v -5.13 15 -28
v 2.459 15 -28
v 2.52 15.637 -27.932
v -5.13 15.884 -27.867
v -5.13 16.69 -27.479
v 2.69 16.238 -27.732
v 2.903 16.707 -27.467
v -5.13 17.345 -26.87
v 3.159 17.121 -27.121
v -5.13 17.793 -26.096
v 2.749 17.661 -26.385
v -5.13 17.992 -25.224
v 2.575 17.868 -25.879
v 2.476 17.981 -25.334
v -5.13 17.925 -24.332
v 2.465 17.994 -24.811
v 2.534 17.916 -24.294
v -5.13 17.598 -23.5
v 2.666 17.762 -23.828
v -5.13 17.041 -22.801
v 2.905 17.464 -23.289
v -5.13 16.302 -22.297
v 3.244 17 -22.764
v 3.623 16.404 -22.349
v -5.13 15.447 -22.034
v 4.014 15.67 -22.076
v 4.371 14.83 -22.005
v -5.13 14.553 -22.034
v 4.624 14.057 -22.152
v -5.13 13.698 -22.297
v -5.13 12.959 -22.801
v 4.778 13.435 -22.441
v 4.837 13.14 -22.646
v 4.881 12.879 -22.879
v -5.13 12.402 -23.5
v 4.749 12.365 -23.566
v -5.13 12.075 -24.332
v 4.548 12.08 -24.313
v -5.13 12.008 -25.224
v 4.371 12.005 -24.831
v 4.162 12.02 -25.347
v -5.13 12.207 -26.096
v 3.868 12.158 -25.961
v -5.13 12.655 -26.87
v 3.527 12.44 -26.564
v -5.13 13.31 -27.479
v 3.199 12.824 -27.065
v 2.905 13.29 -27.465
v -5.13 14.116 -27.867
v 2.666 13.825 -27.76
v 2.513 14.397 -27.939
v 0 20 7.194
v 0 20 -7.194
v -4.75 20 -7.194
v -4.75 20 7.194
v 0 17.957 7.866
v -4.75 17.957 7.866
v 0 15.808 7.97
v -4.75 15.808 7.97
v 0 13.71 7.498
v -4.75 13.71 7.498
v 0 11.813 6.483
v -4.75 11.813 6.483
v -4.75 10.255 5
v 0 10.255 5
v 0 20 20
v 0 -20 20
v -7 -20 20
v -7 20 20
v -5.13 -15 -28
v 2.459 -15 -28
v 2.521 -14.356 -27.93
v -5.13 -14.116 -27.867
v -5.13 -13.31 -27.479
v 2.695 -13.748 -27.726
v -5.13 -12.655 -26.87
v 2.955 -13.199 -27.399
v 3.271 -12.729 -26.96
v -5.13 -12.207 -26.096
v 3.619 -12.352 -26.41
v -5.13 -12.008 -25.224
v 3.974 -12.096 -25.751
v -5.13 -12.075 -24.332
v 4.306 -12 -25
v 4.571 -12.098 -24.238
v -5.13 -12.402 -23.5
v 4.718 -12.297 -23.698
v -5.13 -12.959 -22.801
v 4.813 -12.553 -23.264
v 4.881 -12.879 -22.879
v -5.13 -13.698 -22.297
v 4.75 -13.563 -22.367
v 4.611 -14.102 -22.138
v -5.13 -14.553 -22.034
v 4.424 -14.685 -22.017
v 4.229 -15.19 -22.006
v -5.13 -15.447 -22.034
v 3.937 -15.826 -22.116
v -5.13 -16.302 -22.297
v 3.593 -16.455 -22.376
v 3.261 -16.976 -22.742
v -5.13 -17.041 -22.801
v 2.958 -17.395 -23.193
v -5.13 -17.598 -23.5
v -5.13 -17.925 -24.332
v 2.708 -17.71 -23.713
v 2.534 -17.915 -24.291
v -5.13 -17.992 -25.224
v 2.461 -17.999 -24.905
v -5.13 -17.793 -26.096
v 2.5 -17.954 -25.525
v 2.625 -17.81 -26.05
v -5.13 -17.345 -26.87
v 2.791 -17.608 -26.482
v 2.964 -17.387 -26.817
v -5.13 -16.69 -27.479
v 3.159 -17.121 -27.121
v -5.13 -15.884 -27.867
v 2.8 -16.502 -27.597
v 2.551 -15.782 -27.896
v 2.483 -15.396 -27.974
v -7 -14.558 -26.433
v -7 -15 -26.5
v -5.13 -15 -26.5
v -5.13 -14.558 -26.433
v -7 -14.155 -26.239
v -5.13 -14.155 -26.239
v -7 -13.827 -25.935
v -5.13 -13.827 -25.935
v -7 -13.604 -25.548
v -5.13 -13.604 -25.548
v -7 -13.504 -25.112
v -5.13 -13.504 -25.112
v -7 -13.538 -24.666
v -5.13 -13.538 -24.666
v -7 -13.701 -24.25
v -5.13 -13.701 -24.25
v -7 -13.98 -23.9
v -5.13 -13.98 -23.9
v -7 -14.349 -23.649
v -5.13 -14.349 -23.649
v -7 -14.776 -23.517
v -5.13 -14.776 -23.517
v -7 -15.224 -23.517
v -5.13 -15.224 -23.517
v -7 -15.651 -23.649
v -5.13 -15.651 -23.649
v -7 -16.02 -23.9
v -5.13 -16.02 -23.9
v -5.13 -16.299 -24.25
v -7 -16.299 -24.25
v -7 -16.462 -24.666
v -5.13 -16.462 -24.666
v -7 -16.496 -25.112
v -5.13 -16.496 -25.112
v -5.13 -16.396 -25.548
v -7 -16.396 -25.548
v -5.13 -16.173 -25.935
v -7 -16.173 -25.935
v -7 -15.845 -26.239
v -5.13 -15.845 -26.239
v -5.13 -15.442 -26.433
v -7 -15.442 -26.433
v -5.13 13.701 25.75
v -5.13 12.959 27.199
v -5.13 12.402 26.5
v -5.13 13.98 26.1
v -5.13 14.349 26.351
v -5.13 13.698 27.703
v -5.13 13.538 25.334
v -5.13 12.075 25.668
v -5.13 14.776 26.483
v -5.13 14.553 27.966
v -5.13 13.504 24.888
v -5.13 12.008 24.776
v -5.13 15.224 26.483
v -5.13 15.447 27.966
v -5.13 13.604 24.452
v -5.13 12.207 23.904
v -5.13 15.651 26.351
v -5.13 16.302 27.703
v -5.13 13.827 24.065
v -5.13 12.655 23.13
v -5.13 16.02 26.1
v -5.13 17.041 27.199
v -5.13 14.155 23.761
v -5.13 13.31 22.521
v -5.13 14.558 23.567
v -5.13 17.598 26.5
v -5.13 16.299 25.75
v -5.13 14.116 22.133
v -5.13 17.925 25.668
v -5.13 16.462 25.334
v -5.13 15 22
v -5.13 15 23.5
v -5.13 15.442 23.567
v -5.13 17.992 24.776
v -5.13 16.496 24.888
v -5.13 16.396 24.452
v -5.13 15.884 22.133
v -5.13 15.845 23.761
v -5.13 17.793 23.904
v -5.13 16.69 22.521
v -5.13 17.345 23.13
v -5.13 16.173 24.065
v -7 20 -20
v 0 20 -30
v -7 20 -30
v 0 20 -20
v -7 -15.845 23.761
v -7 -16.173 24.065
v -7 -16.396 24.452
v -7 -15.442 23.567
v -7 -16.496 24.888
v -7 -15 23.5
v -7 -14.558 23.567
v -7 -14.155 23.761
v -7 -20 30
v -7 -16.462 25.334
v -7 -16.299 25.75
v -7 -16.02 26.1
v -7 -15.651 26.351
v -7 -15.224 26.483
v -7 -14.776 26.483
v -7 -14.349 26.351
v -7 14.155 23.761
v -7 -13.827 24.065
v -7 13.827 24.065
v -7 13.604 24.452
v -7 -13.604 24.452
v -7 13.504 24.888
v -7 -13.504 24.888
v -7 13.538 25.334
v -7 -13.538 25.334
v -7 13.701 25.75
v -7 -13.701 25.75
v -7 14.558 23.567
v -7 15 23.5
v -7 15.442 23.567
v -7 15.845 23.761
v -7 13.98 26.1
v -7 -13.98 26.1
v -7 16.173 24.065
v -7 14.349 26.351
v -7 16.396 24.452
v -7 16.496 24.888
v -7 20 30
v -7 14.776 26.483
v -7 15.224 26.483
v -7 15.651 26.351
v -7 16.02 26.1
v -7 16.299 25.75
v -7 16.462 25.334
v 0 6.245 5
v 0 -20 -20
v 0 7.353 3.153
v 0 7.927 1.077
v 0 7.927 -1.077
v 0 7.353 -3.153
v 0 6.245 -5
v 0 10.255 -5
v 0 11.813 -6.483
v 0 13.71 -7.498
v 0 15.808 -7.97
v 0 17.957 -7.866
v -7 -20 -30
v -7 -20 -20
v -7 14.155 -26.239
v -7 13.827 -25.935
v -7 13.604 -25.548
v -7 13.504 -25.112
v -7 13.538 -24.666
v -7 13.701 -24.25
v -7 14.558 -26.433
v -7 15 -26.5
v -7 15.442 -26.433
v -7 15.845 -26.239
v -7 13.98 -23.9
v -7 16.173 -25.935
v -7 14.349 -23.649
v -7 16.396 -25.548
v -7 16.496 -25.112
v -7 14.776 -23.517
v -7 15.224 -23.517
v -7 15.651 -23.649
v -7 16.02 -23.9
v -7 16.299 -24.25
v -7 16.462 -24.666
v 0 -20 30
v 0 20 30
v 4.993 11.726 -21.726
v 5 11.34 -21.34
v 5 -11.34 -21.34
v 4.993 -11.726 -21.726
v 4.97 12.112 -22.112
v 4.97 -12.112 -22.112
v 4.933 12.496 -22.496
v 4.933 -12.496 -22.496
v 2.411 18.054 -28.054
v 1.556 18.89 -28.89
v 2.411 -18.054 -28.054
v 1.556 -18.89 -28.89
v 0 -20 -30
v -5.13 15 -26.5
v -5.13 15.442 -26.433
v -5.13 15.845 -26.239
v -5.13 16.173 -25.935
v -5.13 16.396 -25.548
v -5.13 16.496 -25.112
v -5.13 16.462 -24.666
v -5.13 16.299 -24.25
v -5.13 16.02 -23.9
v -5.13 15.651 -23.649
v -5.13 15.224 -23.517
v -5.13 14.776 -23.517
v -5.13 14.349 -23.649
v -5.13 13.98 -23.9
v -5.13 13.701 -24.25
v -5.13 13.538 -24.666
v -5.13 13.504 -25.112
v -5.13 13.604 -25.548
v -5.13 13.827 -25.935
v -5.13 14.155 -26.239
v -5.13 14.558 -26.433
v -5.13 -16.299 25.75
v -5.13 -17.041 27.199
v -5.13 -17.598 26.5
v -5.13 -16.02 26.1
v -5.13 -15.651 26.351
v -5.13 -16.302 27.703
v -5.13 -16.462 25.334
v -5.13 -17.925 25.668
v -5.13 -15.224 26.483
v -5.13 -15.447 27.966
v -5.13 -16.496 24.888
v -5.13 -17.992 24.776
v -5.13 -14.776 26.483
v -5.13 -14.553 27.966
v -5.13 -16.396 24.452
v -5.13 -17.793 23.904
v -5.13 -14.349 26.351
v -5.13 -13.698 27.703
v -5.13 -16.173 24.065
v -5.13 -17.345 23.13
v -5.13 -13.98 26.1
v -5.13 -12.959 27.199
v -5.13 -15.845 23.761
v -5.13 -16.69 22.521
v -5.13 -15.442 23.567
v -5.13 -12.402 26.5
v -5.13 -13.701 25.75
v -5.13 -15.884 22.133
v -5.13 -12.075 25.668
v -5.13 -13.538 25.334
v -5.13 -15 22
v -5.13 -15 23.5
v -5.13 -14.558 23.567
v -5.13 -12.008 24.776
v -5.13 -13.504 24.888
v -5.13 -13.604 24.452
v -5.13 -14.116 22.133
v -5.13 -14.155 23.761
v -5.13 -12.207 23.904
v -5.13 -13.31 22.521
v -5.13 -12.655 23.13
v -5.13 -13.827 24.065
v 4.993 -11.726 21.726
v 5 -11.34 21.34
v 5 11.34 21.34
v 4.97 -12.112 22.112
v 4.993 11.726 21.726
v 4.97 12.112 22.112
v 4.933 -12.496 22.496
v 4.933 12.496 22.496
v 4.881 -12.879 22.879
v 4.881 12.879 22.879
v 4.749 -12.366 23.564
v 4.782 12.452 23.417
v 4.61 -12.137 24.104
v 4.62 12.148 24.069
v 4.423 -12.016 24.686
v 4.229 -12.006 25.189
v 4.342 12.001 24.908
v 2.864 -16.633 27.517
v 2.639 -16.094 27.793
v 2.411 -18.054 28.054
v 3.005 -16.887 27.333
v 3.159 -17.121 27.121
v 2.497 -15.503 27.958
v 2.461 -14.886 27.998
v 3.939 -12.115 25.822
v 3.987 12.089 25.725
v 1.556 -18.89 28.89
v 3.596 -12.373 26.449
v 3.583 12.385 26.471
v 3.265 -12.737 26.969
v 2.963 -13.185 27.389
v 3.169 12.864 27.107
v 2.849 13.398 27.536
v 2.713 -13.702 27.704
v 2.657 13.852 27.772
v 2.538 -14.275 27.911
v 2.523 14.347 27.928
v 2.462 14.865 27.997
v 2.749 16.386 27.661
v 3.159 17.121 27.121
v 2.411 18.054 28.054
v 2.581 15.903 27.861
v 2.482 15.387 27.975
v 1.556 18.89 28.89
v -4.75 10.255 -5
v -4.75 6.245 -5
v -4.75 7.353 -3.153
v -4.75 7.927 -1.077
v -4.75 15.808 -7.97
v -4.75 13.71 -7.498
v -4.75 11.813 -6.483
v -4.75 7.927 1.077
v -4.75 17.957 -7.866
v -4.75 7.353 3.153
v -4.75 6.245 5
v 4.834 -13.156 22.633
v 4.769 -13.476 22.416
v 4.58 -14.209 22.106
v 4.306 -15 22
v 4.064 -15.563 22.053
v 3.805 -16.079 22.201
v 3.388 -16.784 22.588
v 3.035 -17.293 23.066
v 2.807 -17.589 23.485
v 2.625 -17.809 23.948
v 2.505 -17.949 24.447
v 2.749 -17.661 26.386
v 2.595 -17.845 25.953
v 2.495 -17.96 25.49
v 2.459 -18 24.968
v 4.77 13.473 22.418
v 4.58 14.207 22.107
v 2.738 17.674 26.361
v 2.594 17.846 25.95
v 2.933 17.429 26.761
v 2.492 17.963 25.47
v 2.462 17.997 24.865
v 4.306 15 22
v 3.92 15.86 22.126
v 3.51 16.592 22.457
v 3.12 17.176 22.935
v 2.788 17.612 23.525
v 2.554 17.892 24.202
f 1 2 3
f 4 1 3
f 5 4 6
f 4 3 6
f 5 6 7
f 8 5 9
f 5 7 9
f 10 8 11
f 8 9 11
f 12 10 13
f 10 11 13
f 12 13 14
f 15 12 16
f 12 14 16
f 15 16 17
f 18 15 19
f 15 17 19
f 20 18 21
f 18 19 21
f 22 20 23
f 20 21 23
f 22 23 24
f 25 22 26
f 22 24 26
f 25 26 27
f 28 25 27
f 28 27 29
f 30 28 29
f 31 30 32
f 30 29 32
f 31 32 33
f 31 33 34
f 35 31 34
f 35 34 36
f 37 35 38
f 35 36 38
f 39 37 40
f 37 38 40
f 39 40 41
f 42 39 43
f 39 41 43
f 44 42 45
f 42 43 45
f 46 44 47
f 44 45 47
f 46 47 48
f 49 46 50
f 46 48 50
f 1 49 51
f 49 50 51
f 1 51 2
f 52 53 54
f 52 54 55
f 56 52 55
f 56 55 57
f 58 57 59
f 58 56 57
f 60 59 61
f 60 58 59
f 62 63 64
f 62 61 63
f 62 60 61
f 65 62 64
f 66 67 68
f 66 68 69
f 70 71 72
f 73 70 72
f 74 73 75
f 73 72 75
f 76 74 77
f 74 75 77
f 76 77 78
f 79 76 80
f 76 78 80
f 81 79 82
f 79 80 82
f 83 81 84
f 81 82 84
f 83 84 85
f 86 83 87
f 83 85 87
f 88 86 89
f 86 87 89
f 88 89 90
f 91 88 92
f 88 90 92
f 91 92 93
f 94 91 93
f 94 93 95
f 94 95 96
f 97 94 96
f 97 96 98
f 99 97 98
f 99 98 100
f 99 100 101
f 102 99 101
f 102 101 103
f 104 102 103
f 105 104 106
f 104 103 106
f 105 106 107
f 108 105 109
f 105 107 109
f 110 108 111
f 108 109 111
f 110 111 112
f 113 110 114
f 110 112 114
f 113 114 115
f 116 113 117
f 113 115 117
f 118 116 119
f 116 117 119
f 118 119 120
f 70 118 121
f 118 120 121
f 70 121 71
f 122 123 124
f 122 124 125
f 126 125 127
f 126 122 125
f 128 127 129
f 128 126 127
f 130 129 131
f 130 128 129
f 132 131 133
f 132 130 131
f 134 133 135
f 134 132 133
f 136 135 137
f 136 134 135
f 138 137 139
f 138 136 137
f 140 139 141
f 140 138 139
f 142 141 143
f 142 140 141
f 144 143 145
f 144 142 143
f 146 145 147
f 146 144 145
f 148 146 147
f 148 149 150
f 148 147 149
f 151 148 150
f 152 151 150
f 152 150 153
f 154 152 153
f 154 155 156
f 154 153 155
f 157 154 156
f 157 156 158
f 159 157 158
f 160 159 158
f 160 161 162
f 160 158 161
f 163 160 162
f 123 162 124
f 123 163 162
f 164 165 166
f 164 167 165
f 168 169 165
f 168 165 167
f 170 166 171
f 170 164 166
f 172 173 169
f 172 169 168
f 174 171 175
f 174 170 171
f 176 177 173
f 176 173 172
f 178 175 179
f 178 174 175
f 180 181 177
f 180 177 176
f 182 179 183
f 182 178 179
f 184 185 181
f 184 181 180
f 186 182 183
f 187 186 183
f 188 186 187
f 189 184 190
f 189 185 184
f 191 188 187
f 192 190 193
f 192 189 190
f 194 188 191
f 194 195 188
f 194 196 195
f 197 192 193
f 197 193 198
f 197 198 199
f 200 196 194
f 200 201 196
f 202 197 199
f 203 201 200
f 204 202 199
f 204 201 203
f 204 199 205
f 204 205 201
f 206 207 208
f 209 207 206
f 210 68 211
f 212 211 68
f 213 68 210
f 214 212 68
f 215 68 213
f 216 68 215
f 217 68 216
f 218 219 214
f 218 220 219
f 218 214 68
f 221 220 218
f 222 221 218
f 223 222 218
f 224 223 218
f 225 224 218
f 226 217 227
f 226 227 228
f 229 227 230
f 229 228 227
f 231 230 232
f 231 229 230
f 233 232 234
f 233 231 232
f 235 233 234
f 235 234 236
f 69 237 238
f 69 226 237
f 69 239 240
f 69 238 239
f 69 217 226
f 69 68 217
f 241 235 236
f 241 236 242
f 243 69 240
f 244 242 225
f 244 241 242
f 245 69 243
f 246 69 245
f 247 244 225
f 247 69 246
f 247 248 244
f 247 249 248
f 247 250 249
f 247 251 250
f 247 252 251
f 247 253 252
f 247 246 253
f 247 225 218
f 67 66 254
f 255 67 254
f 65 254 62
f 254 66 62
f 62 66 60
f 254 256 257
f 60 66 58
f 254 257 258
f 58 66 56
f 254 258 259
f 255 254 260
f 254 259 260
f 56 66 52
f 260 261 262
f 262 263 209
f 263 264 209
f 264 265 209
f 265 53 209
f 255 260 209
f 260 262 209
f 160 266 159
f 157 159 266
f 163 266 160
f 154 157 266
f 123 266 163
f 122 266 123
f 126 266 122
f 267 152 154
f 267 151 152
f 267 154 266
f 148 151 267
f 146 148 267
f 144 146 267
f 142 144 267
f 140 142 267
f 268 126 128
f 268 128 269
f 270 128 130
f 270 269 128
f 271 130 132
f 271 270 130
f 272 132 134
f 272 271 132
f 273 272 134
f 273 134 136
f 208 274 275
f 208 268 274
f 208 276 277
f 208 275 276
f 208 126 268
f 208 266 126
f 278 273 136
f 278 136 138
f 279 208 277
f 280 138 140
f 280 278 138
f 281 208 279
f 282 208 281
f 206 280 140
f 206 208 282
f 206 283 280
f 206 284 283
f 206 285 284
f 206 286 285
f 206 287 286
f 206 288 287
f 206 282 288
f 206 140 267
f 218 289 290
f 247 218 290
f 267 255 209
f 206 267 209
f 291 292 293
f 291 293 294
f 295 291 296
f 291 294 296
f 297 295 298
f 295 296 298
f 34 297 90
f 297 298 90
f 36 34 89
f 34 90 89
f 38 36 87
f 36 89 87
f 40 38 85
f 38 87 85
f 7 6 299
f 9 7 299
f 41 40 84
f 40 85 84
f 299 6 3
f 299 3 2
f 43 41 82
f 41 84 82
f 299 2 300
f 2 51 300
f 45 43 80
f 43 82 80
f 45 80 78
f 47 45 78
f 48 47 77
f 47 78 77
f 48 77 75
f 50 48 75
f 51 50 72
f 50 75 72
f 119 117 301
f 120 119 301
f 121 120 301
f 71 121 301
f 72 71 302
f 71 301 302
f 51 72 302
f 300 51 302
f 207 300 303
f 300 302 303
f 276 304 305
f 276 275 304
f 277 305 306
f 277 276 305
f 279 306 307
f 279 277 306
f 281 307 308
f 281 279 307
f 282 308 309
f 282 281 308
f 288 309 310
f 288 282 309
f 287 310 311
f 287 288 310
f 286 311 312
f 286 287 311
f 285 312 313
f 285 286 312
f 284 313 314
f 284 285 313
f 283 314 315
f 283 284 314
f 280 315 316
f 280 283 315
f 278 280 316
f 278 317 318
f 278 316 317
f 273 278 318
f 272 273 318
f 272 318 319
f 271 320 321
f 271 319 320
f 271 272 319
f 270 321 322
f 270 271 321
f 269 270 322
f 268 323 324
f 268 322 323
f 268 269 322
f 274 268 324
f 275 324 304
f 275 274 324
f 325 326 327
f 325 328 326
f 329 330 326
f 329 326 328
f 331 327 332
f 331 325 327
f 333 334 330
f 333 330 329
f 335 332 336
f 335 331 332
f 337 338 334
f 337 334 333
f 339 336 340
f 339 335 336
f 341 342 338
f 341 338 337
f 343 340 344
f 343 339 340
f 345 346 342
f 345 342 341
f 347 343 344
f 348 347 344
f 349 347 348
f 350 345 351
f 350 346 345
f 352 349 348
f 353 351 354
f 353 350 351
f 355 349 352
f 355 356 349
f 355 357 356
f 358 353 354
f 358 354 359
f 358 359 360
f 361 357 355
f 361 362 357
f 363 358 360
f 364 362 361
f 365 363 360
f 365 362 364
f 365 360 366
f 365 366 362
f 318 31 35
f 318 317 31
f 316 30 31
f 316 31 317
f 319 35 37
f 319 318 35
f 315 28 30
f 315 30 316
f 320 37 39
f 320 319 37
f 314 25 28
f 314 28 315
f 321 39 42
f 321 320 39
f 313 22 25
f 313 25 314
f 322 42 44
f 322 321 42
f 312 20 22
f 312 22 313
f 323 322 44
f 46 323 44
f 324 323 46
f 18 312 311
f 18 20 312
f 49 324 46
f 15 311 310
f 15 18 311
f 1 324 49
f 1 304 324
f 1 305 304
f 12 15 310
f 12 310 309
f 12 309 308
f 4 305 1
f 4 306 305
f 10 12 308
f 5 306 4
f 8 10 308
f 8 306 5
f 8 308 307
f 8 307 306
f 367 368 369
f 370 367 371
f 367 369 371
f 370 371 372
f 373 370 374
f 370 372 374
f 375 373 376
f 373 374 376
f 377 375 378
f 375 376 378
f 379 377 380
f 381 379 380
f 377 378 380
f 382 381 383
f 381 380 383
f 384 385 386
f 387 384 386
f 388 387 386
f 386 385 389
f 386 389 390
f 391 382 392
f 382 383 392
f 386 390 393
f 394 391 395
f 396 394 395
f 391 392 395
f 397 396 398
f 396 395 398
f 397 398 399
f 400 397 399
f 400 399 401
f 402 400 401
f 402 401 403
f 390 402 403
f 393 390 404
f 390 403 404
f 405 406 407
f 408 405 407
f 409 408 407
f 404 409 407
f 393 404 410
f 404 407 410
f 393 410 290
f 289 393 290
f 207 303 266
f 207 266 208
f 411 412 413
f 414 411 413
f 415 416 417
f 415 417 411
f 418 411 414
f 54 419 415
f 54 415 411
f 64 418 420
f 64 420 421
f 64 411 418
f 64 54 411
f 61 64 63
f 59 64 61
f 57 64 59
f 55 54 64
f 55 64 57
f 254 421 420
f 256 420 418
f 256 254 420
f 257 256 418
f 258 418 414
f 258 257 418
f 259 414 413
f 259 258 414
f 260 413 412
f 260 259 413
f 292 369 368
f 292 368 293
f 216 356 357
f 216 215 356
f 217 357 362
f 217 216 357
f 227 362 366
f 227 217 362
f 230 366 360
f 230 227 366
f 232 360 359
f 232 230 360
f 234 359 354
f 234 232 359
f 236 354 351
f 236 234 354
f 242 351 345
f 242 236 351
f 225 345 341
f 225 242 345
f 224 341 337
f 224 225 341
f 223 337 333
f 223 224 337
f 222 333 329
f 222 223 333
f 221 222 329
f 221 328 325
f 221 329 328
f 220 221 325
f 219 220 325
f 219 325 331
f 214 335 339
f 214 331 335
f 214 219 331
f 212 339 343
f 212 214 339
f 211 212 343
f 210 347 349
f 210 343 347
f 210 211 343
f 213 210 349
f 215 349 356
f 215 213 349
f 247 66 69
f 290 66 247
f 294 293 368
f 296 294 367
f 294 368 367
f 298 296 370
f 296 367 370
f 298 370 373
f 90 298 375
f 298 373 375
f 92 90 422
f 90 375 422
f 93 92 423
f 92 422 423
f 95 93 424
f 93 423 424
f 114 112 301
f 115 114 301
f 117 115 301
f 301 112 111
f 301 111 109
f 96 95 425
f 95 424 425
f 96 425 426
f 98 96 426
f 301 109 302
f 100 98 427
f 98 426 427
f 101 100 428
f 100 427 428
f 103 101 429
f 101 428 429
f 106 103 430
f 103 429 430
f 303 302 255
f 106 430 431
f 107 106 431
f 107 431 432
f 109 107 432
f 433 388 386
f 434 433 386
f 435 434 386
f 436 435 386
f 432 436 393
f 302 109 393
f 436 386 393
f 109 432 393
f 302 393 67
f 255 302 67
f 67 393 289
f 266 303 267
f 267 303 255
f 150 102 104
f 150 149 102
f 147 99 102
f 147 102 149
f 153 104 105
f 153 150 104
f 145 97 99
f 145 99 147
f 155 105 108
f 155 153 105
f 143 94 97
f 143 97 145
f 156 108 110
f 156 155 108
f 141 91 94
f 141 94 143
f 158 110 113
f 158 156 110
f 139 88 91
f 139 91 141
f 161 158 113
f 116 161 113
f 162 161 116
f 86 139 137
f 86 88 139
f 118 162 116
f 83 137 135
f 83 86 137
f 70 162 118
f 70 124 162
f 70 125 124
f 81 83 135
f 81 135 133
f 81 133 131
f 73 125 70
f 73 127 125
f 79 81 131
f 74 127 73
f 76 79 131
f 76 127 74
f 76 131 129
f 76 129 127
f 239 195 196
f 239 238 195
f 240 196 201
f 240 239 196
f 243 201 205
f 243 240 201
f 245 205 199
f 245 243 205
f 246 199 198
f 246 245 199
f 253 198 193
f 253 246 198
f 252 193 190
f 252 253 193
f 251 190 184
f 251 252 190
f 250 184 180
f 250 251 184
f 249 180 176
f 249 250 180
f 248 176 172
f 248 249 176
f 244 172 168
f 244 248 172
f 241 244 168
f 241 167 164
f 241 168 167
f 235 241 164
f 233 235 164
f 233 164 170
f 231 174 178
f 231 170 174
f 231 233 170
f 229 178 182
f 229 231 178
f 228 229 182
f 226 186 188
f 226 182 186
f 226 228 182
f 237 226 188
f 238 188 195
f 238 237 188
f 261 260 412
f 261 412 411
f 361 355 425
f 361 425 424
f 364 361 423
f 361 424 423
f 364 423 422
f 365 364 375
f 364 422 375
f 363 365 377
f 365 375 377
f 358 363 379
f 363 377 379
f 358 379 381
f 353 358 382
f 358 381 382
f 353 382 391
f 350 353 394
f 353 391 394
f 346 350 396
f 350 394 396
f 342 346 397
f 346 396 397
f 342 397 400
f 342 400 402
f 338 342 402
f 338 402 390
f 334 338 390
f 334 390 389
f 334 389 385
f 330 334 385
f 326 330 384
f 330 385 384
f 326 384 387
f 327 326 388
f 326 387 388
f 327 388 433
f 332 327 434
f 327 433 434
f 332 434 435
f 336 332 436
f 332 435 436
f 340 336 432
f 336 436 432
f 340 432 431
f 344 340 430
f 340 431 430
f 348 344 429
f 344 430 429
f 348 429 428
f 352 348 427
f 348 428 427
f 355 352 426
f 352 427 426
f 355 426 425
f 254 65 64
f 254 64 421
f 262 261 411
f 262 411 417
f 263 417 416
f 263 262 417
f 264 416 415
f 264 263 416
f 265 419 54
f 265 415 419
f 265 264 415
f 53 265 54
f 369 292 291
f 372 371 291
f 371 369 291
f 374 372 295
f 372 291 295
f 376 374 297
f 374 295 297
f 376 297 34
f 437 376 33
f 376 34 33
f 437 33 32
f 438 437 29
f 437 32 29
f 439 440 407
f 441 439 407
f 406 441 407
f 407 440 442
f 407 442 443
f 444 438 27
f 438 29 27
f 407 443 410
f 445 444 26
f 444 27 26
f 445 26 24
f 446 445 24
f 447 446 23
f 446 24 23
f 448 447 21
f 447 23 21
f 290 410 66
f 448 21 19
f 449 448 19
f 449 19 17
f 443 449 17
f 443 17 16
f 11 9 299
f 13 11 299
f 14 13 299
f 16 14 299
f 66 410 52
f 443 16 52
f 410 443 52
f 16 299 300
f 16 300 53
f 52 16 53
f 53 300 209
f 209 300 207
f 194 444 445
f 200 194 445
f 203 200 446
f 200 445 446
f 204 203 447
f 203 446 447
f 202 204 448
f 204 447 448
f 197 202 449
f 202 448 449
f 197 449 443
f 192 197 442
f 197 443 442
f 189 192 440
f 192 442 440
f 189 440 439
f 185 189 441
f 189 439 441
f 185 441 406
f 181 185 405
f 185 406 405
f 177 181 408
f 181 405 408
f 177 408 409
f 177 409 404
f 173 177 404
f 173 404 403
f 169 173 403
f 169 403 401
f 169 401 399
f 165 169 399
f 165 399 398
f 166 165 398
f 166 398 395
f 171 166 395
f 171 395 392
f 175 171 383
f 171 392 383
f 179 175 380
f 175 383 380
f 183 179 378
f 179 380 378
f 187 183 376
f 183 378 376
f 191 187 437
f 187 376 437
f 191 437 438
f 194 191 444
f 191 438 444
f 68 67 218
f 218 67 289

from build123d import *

# Parameters (mm, degrees)
CROQUIS1_W                 = 60
CROQUIS1_H                 = 40
SALIENTE_EXTRUIR1_DEPTH    = 5
CROQUIS3_R                 = 1.5
CORTAR_EXTRUIR1_DEPTH      = 37.400549446
REDONDEO1_R                = 10
CROQUIS5_R                 = 3
CORTAR_EXTRUIR2_DEPTH      = 3.5
CROQUIS9_W                 = 10
CROQUIS9_H                 = 40
SALIENTE_EXTRUIR3_DEPTH    = 7
CORTAR_EXTRUIR5_DEPTH      = 37.728735481
CORTAR_EXTRUIR5_DEPTH_BACK = 37.728735481
CROQUIS10_R                = 1.5
CROQUIS11_R                = 3
CORTAR_EXTRUIR6_DEPTH      = 6.63
SALIENTE_EXTRUIR4_DEPTH    = 7
CORTAR_EXTRUIR7_START      = -7
CROQUIS13_R                = 8
CORTAR_EXTRUIR7_DEPTH      = 7
CORTAR_EXTRUIR8_START      = -2.25
CORTAR_EXTRUIR8_DEPTH      = 2.25


with BuildPart() as part:
    # Croquis1 → Saliente-Extruir1 (new body)
    with BuildSketch(Plane(origin=(0, 0, 0), x_dir=(0, 0, -1), z_dir=(1, 0, 0))):
        Rectangle(CROQUIS1_W, CROQUIS1_H)
    extrude(amount=SALIENTE_EXTRUIR1_DEPTH)

    # Croquis3 → Cortar-Extruir1 (cut, through all)
    with BuildSketch(Plane(origin=(5, 0, 0), x_dir=(0, 0, -1), z_dir=(1, 0, 0))):
        with Locations((-25, 15)):
            Circle(CROQUIS3_R)
        with Locations(Location((25, 15, 0), (0, 0, 180))):
            Circle(CROQUIS3_R)
        with Locations((25, -15)):
            Circle(CROQUIS3_R)
        with Locations(Location((-25, -15, 0), (0, 0, 180))):
            Circle(CROQUIS3_R)
    extrude(amount=-CORTAR_EXTRUIR1_DEPTH, mode=Mode.SUBTRACT)

    # Redondeo1
    # the kernel refuses this fillet: 10 mm, written as the material it takes off along each edge
    with BuildSketch(Plane(origin=(5, -20, 51.650635095), x_dir=(-1, 0, 0), z_dir=(0, 0, -1))) as redondeo1_piece_1:
        with BuildLine():
            CenterArc((10, 8.660254038), REDONDEO1_R, 180, 60)
            Line((0, 8.660254038), (-0.2, 8.660254038))
            Line((-0.2, 8.660254038), (-0.2, 0))
            Line((-0.2, 0), (0, -0.2))
            ThreePointArc((0, -0.2), (2.5, -0.2), (4.9, -0.173205081))
            Line((4.9, -0.173205081), (5, 0))
        make_face()
    extrude(amount=103.301270189, mode=Mode.SUBTRACT)
    with BuildSketch(Plane(origin=(5, 20, -51.650635095), x_dir=(0, -1, 0), z_dir=(0, 0, 1))) as redondeo1_piece_2:
        with BuildLine():
            CenterArc((8.660254038, -10), REDONDEO1_R, 90, 60)
            Line((0, -5), (-0.173205081, -4.9))
            ThreePointArc((-0.173205081, -4.9), (-0.2, -2.5), (-0.2, 0))
            Line((-0.2, 0), (0, 0.2))
            Line((0, 0.2), (8.660254038, 0.2))
            Line((8.660254038, 0.2), (8.660254038, 0))
        make_face()
    extrude(amount=103.301270189, mode=Mode.SUBTRACT)
    with BuildSketch(Plane(origin=(5, 41.650635095, 30), x_dir=(-1, 0, 0), z_dir=(0, -1, 0)), Plane(origin=(5, -41.650635095, -30), x_dir=(-1, 0, 0), z_dir=(0, 1, 0))) as redondeo1_piece_3:
        with BuildLine():
            CenterArc((10, 8.660254038), REDONDEO1_R, 180, 60)
            Line((0, 8.660254038), (-0.2, 8.660254038))
            Line((-0.2, 8.660254038), (-0.2, 0))
            Line((-0.2, 0), (0, -0.2))
            ThreePointArc((0, -0.2), (2.5, -0.2), (4.9, -0.173205081))
            Line((4.9, -0.173205081), (5, 0))
        make_face()
    extrude(amount=83.301270189, mode=Mode.SUBTRACT)

    # Croquis5 → Cortar-Extruir2 (cut)
    with BuildSketch(Plane(origin=(5, 0, 0), x_dir=(0, 0, -1), z_dir=(1, 0, 0))):
        with Locations((-25, 15)):
            Circle(CROQUIS5_R)
        with Locations((25, 15)):
            Circle(CROQUIS5_R)
        with Locations((25, -15)):
            Circle(CROQUIS5_R)
        with Locations((-25, -15)):
            Circle(CROQUIS5_R)
    extrude(amount=-CORTAR_EXTRUIR2_DEPTH, mode=Mode.SUBTRACT)

    # Croquis9 → Saliente-Extruir3 (add)
    with BuildSketch(Plane.ZY):
        with Locations((-25, 0)):
            Rectangle(CROQUIS9_W, CROQUIS9_H)
        with Locations((25, 0)):
            Rectangle(CROQUIS9_W, CROQUIS9_H)
    extrude(amount=SALIENTE_EXTRUIR3_DEPTH)

    # Croquis10 → Cortar-Extruir5 (cut, two sides: drawn at the far end of the back side and taken through both)
    with BuildSketch(Plane(origin=(0, 0, 0), x_dir=(0, 0, -1), z_dir=(1, 0, 0)).offset(-CORTAR_EXTRUIR5_DEPTH_BACK)):
        with Locations((-25, -15)):
            Circle(CROQUIS10_R)
        with Locations((25, -15)):
            Circle(CROQUIS10_R)
        with Locations((25, 15)):
            Circle(CROQUIS10_R)
        with Locations((-25, 15)):
            Circle(CROQUIS10_R)
    extrude(amount=CORTAR_EXTRUIR5_DEPTH + CORTAR_EXTRUIR5_DEPTH_BACK, mode=Mode.SUBTRACT)

    # Croquis11 → Cortar-Extruir6 (cut)
    with BuildSketch(Plane(origin=(1.5, 0, 0), x_dir=(0, 0, -1), z_dir=(1, 0, 0))):
        with Locations((-25, 15)):
            Circle(CROQUIS11_R)
        with Locations((25, -15)):
            Circle(CROQUIS11_R)
        with Locations((-25, -15)):
            Circle(CROQUIS11_R)
        with Locations((25, 15)):
            Circle(CROQUIS11_R)
    extrude(amount=-CORTAR_EXTRUIR6_DEPTH, mode=Mode.SUBTRACT)

    # Croquis12 → Saliente-Extruir4 (add)
    with BuildSketch(Plane.ZY):
        with BuildLine():
            Line((-5, 6.244997998), (-5, 10.255002002))
            ThreePointArc((-5, 10.255002002), (-7.804685433, 14.743046588), (-7.193747285, 20))
            Line((-7.193747285, 20), (7.193747285, 20))
            ThreePointArc((7.193747285, 20), (7.804685433, 14.743046588), (5, 10.255002002))
            Line((5, 10.255002002), (5, 6.244997998))
            ThreePointArc((5, 6.244997998), (0, -8), (-5, 6.244997998))
        make_face()
    extrude(amount=SALIENTE_EXTRUIR4_DEPTH)

    # Croquis13 → Cortar-Extruir7 (cut)
    with BuildSketch(Plane.ZY.offset(7).offset(CORTAR_EXTRUIR7_START)):
        Circle(CROQUIS13_R)
    extrude(amount=CORTAR_EXTRUIR7_DEPTH, mode=Mode.SUBTRACT)

    # Croquis15 → Cortar-Extruir8 (cut)
    with BuildSketch(Plane.ZY.offset(7).offset(CORTAR_EXTRUIR8_START)):
        with BuildLine():
            Line((5, 6.244997998), (5, 10.255002002))
            ThreePointArc((5, 10.255002002), (7.804685433, 14.743046588), (7.193747285, 20))
            Line((7.193747285, 20), (-7.193747285, 20))
            ThreePointArc((-7.193747285, 20), (-7.804685433, 14.743046588), (-5, 10.255002002))
            Line((-5, 10.255002002), (-5, 6.244997998))
            ThreePointArc((-5, 6.244997998), (0, 8), (5, 6.244997998))
        make_face()
    extrude(amount=CORTAR_EXTRUIR8_DEPTH, mode=Mode.SUBTRACT)


solid = part.part
